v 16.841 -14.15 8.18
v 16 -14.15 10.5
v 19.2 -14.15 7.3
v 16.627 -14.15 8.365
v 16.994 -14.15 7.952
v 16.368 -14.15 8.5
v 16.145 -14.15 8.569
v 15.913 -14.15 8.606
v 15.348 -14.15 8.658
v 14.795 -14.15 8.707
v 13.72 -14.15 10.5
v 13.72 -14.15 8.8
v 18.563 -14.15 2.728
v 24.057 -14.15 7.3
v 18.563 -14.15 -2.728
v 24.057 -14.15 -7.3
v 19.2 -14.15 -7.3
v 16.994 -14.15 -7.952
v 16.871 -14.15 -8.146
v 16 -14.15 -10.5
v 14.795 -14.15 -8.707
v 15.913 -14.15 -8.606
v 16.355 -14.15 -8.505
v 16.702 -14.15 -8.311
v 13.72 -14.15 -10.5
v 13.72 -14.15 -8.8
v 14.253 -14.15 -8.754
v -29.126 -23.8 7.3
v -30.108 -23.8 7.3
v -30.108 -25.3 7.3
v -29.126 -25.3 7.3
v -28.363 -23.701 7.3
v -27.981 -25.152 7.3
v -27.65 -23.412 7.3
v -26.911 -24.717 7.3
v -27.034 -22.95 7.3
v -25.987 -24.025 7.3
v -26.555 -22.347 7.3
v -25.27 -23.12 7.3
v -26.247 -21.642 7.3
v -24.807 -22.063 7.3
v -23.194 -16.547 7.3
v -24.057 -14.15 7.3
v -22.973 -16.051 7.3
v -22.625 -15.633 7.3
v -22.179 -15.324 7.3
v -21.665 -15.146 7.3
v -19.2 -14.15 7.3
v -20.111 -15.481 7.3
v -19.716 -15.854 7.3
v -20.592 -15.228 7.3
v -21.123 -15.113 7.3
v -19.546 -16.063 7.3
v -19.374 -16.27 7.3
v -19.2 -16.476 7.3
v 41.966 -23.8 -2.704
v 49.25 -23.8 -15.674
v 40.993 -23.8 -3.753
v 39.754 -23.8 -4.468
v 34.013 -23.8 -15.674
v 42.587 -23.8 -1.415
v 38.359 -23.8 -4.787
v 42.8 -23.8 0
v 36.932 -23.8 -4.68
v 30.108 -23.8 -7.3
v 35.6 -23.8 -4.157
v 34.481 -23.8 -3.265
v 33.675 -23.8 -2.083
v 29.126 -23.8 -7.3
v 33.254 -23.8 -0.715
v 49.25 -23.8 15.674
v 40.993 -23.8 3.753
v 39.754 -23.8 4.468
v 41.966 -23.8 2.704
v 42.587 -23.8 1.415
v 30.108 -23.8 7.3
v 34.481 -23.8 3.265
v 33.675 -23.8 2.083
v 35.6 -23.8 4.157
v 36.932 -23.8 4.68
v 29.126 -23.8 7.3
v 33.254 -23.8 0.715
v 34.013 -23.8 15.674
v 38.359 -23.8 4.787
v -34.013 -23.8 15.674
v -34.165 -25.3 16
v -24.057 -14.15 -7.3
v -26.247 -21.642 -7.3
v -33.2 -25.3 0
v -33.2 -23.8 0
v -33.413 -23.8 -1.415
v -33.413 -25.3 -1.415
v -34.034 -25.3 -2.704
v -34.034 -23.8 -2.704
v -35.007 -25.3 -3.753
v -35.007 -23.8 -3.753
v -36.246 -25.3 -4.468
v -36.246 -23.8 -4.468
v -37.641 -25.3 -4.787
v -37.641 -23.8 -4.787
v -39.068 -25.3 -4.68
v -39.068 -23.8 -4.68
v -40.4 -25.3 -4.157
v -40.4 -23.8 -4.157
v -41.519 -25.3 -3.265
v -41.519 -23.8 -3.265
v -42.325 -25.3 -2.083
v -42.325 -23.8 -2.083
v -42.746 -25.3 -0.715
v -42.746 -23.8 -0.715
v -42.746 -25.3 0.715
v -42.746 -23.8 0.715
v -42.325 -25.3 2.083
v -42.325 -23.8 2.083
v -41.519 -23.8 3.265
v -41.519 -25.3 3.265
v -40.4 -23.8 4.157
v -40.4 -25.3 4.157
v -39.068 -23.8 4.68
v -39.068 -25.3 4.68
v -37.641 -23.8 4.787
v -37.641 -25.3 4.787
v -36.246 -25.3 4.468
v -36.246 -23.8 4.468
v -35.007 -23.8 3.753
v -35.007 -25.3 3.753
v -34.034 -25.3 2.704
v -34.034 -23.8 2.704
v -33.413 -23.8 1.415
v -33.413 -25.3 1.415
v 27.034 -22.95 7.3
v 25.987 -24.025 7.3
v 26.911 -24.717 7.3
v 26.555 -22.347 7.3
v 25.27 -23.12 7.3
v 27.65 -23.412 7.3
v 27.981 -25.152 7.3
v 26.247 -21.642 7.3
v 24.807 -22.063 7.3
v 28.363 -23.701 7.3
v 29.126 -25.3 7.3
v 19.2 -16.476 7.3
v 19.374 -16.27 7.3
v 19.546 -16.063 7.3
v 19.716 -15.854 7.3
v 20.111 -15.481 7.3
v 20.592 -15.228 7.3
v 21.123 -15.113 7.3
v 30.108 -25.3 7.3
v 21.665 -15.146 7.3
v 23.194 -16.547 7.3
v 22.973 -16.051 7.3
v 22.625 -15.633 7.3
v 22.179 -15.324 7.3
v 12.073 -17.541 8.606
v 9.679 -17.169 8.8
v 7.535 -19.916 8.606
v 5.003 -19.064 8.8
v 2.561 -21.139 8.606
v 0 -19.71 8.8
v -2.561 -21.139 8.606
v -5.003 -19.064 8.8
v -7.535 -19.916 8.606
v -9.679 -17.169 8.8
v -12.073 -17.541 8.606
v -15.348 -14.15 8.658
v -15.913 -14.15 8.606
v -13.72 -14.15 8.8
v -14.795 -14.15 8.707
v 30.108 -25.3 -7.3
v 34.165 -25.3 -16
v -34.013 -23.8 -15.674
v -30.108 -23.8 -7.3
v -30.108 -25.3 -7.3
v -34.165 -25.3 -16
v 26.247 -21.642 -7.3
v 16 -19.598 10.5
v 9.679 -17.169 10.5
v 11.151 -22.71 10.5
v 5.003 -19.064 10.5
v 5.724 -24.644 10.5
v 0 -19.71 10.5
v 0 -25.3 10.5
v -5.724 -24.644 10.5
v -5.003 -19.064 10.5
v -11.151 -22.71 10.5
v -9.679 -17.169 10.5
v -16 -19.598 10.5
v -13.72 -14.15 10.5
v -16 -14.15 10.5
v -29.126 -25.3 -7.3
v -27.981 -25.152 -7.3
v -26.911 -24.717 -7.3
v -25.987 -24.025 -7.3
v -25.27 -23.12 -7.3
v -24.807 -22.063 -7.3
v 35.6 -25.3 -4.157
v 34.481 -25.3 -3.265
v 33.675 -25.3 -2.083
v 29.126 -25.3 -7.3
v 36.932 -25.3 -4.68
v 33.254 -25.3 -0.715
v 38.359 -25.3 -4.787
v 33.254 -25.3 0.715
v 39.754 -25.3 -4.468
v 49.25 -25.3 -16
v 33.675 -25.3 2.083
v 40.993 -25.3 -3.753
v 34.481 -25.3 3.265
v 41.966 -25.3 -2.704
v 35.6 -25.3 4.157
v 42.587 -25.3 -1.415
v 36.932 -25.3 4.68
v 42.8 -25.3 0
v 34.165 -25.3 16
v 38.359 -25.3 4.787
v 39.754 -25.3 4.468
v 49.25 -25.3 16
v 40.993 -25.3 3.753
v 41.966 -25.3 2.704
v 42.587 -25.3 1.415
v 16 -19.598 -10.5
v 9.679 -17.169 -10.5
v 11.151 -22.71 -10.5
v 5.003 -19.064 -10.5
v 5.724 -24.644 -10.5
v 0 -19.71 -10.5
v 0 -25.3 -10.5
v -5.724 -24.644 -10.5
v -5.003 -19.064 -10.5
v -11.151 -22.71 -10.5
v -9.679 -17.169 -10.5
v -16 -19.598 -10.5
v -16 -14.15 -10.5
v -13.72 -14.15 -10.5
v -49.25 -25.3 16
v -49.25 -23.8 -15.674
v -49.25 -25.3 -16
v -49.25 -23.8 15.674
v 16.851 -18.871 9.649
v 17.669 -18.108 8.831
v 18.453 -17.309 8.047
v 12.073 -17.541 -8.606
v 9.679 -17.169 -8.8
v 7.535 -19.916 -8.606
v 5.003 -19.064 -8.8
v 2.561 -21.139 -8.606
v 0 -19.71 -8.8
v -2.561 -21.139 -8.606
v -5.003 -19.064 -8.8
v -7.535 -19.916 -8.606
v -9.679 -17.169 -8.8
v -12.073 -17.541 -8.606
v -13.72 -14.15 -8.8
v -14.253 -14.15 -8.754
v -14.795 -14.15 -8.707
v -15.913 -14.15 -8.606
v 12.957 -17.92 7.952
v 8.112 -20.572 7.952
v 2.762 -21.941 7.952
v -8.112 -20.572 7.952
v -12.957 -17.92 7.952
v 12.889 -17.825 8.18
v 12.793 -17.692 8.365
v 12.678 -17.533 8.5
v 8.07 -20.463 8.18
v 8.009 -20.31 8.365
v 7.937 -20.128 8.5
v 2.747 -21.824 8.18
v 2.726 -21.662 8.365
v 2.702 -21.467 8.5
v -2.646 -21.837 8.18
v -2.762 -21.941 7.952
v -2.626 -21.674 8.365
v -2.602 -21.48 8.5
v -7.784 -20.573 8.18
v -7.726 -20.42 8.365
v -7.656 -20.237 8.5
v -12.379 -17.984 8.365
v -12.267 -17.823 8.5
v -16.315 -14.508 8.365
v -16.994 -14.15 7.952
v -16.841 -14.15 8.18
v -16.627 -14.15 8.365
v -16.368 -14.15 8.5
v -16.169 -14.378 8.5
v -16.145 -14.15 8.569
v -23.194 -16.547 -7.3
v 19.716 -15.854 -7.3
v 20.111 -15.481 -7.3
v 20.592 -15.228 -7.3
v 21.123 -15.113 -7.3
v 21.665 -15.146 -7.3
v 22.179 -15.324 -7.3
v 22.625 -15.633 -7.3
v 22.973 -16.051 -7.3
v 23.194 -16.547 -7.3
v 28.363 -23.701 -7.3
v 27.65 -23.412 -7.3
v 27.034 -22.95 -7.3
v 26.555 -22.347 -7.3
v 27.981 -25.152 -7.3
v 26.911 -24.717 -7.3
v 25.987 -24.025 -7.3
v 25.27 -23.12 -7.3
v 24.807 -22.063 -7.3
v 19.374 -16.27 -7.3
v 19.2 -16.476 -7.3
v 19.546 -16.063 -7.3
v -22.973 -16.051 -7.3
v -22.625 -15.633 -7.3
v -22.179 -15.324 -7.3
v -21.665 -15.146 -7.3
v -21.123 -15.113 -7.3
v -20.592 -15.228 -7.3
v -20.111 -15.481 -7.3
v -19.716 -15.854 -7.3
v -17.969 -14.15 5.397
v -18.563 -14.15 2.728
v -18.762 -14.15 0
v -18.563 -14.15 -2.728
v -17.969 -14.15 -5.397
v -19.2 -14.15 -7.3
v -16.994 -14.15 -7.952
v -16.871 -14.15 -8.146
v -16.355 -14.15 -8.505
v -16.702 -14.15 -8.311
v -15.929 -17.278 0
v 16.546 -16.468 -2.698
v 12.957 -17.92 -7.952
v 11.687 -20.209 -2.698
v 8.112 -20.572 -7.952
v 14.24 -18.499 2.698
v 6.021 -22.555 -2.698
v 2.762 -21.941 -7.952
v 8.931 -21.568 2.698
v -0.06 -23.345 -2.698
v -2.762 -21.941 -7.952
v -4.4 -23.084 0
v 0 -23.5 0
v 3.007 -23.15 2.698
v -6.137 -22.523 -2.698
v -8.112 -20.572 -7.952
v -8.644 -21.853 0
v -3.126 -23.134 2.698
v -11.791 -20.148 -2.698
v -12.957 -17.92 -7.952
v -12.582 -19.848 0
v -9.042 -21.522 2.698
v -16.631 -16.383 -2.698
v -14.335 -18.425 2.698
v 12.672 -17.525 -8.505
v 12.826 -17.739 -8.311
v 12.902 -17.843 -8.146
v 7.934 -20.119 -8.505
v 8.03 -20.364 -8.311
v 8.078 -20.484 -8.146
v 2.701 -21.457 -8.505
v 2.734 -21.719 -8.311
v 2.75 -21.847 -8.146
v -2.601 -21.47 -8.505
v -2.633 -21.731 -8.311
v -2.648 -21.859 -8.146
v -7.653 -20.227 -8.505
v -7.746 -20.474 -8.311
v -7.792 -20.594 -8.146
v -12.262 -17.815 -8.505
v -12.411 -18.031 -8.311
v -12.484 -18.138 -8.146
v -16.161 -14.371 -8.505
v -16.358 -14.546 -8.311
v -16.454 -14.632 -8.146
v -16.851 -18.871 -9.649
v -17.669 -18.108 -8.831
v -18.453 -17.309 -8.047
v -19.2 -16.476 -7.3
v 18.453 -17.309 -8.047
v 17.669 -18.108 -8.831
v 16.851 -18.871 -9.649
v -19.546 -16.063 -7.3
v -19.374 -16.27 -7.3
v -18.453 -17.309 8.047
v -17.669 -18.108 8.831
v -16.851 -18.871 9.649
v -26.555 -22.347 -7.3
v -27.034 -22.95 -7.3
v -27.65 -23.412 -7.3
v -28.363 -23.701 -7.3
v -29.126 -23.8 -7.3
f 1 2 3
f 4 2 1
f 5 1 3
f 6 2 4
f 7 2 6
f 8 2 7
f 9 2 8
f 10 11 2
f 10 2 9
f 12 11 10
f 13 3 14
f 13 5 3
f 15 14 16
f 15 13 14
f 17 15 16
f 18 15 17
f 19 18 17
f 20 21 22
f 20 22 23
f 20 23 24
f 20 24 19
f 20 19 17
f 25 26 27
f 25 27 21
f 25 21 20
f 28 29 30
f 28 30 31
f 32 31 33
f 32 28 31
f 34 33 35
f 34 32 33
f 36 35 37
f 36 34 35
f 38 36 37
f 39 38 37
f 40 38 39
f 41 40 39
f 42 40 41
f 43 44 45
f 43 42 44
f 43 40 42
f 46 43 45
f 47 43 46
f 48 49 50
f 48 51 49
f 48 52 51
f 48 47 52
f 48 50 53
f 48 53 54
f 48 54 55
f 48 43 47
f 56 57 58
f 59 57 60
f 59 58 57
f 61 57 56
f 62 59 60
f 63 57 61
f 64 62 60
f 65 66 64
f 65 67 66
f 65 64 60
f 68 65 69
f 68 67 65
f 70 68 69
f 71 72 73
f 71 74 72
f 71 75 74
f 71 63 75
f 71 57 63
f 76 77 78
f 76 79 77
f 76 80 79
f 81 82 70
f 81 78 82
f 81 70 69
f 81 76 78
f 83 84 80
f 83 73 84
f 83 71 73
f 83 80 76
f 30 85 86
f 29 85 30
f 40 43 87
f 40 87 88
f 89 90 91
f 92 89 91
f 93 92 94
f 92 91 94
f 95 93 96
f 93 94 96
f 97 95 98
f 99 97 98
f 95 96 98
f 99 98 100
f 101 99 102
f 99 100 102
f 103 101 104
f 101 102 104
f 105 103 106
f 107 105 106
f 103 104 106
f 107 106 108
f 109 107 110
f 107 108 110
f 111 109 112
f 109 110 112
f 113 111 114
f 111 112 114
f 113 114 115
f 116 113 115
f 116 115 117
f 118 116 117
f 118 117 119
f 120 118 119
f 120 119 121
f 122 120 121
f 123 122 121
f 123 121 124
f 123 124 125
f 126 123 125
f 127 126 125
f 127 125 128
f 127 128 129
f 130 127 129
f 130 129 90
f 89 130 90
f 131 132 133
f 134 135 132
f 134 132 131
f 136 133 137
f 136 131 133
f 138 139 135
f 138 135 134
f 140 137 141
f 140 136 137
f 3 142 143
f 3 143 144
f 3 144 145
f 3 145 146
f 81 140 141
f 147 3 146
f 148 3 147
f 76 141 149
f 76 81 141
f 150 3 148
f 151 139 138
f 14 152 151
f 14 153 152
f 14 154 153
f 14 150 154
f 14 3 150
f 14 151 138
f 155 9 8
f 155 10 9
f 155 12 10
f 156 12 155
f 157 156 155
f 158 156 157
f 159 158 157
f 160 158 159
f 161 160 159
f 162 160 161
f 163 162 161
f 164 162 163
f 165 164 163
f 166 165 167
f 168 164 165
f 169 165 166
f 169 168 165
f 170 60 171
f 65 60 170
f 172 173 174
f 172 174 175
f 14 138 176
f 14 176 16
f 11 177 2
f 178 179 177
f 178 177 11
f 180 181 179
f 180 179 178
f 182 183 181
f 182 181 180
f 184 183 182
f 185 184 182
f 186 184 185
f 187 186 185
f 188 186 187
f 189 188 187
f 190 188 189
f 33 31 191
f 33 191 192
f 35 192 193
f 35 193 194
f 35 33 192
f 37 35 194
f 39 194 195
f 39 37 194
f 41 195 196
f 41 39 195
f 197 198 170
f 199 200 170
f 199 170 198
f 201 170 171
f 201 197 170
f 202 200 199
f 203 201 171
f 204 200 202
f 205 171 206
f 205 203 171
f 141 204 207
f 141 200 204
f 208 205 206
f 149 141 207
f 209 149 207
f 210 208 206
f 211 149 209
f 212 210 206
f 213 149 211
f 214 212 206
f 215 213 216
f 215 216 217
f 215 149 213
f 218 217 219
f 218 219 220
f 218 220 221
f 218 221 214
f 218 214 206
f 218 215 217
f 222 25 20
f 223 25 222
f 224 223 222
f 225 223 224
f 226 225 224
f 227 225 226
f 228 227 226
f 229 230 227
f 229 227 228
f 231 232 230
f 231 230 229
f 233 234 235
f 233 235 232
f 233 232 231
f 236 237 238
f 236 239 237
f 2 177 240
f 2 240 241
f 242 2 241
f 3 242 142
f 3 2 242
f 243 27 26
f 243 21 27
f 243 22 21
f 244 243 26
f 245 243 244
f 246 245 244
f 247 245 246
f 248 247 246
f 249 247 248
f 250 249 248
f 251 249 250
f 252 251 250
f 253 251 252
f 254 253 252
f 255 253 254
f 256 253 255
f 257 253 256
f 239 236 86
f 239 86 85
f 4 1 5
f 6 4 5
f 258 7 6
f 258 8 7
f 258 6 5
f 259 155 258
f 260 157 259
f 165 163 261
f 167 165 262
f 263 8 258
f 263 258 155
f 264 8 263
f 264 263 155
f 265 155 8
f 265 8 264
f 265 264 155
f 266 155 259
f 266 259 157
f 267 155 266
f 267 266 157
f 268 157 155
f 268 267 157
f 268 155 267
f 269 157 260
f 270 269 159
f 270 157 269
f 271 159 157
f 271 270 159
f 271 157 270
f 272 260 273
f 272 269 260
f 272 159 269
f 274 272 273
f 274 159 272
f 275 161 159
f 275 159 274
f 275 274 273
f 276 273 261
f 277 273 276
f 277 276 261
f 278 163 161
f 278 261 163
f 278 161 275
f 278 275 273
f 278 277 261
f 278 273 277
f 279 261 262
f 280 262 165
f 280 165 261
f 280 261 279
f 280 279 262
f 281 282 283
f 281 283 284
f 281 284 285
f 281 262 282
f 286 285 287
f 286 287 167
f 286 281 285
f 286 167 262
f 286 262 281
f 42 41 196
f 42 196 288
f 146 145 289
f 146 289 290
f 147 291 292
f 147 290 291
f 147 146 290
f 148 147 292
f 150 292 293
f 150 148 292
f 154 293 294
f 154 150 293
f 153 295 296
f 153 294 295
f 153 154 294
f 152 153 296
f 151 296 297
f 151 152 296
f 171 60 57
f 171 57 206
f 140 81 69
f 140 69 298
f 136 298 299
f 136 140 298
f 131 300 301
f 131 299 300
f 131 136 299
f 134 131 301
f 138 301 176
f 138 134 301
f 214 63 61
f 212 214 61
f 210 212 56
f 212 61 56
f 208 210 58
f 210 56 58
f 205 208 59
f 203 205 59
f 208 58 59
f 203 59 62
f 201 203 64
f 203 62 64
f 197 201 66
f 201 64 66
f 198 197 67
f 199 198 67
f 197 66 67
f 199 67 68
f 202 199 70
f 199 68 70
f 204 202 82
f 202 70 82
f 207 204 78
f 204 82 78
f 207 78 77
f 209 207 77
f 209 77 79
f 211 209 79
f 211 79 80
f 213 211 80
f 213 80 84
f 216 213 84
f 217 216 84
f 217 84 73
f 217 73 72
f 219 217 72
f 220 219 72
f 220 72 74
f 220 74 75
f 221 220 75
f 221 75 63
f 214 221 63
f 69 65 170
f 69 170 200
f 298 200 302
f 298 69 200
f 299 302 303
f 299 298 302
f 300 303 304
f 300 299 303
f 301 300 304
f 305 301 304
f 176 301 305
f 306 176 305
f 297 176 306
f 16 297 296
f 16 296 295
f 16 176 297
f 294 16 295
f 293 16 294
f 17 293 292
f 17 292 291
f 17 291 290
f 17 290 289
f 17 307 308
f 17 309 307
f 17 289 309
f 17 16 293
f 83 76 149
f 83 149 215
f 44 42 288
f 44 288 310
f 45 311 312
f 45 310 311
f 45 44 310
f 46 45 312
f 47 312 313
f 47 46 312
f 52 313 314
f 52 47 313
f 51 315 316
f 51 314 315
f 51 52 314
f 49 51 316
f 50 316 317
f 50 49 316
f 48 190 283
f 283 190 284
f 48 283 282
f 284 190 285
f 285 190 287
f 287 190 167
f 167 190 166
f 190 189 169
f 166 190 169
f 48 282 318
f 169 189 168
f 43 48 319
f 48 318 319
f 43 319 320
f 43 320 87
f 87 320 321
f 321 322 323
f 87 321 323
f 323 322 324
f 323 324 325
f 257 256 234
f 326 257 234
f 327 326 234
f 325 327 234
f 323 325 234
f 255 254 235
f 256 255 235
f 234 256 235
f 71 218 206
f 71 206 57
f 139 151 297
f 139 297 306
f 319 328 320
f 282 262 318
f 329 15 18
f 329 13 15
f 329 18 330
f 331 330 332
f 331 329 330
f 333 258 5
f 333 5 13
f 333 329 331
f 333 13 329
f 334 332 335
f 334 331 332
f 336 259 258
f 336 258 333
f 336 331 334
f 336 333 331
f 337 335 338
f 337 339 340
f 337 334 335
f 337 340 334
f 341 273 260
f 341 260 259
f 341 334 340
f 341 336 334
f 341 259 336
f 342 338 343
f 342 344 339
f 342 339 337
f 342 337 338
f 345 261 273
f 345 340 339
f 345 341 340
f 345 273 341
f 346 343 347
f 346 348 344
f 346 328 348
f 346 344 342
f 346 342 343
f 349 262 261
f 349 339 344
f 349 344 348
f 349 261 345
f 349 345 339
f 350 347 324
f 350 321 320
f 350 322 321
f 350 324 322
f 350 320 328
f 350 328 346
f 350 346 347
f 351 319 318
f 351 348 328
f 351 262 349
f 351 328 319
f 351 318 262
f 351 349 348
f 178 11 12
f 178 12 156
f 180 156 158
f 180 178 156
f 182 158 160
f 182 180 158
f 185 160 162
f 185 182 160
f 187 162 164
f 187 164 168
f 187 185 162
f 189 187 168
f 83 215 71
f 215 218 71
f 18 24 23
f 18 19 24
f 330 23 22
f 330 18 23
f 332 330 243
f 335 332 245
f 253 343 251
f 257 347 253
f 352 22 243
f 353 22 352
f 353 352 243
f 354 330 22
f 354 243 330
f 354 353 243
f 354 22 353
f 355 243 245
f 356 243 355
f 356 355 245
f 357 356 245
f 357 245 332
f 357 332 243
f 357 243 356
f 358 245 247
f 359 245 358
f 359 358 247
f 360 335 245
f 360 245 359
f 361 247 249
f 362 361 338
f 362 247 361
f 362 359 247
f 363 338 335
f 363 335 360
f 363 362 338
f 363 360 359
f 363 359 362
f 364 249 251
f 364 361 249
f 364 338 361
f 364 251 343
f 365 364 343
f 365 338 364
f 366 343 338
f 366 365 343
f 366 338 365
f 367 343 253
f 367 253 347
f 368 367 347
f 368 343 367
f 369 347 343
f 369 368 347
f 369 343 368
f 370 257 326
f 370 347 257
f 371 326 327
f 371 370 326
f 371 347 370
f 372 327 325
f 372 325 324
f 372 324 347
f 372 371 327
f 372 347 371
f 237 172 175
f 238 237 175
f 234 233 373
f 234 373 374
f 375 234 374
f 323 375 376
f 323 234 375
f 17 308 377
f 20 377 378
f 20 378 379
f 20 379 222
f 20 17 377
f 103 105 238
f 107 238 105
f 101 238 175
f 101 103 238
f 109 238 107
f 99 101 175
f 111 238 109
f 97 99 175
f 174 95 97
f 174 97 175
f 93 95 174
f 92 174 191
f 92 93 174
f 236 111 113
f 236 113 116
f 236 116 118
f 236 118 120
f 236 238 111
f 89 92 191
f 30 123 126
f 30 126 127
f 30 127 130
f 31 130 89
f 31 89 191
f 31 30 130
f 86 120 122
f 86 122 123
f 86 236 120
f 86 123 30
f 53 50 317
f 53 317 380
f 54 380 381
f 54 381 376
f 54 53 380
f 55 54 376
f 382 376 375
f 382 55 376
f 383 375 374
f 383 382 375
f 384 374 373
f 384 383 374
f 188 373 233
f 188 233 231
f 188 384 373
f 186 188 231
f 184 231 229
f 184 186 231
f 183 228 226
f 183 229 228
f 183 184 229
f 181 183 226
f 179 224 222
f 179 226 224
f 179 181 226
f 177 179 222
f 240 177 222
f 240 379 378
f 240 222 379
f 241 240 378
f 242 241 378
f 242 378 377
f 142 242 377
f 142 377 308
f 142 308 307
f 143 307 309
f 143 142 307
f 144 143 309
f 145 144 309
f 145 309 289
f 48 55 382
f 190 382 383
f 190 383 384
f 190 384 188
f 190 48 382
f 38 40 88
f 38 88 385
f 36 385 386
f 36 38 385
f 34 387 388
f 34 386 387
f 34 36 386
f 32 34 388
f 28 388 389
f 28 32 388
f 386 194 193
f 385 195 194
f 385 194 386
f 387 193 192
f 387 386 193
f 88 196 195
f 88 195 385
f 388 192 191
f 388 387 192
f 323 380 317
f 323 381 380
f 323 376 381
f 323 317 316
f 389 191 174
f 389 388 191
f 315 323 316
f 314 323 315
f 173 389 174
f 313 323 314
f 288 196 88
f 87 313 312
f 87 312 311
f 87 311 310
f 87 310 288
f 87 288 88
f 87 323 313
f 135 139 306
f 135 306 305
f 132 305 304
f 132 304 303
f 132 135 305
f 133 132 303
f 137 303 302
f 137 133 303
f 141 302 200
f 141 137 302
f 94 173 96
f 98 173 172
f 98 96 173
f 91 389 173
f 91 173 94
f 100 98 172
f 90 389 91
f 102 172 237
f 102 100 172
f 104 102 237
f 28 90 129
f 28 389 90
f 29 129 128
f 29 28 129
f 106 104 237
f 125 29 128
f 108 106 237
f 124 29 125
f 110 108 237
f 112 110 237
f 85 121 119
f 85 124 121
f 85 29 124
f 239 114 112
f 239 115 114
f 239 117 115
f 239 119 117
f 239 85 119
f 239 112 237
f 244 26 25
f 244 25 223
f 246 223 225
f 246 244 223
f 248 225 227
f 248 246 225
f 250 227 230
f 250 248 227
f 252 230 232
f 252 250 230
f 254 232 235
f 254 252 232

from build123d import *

# Parameters (mm, degrees)
SALIENTE_EXTRUIR1_DEPTH      = 16
SALIENTE_EXTRUIR1_DEPTH_BACK = 16
CORTAR_EXTRUIR1_DEPTH        = 49.25
CORTAR_EXTRUIR1_DEPTH_BACK   = 49.25
CROQUIS3_R                   = 4.8
CORTAR_EXTRUIR2_DEPTH        = 25.3
CROQUIS4_R                   = 4.8
CORTAR_EXTRUIR3_DEPTH        = 25.3
CORTAR_EXTRUIR4_DEPTH        = 98.5
CORTAR_EXTRUIR4_DEPTH_BACK   = 98.5
CROQUIS6_W                   = 64
CROQUIS6_H                   = 50.5
CROQUIS7_W                   = 118.5
CROQUIS7_H                   = 52
CORTAR_EXTRUIR5_DEPTH        = 25.3


with BuildPart() as part:
    # Croquis1 → Saliente-Extruir1 (new, two sides: drawn at the far end of the back side and taken through both)
    with BuildSketch(Plane.XY.offset(-SALIENTE_EXTRUIR1_DEPTH_BACK)):
        with BuildLine():
            Line((-49.25, -23.8), (-49.25, -25.3))
            Line((-49.25, -25.3), (-29.12605042, -25.3))
            ThreePointArc((-29.12605042, -25.3), (-26.427107301, -24.400792418), (-24.806790899, -22.062536016))
            Line((-24.806790899, -22.062536016), (-23.194455177, -16.5465774))
            ThreePointArc((-23.194455177, -16.5465774), (-21.665135808, -15.146167956), (-19.716192024, -15.854392832))
            ThreePointArc((-19.716192024, -15.854392832), (0, -25.3), (19.716192024, -15.854392832))
            ThreePointArc((19.716192024, -15.854392832), (21.665135808, -15.146167956), (23.194455177, -16.5465774))
            Line((23.194455177, -16.5465774), (24.806790899, -22.062536016))
            ThreePointArc((24.806790899, -22.062536016), (26.427107301, -24.400792418), (29.12605042, -25.3))
            Line((29.12605042, -25.3), (49.25, -25.3))
            Line((49.25, -25.3), (49.25, -23.8))
            Line((49.25, -23.8), (29.12605042, -23.8))
            ThreePointArc((29.12605042, -23.8), (27.326755007, -23.200528279), (26.246544073, -21.641690678))
            Line((26.246544073, -21.641690678), (22.185653478, -7.748985725))
            ThreePointArc((22.185653478, -7.748985725), (0, -23.5), (-22.185653478, -7.748985725))
            Line((-22.185653478, -7.748985725), (-26.246544073, -21.641690678))
            ThreePointArc((-26.246544073, -21.641690678), (-27.326755007, -23.200528279), (-29.12605042, -23.8))
            Line((-29.12605042, -23.8), (-49.25, -23.8))
        make_face()
    extrude(amount=SALIENTE_EXTRUIR1_DEPTH + SALIENTE_EXTRUIR1_DEPTH_BACK)

    # Croquis2 → Cortar-Extruir1 (cut, two sides: drawn at the far end of the back side and taken through both)
    with BuildSketch(Plane(origin=(0, 0, 0), x_dir=(0, 0, -1), z_dir=(1, 0, 0)).offset(-CORTAR_EXTRUIR1_DEPTH_BACK)):
        Polygon((-16, -25.3), (-10.5, 0), (-10.5, 25.2), (10.5, 25.2), (10.5, 0), (16, -25.3), (16, 26.2), (-16, 26.2), align=None)
    extrude(amount=CORTAR_EXTRUIR1_DEPTH + CORTAR_EXTRUIR1_DEPTH_BACK, mode=Mode.SUBTRACT)

    # Croquis3 → Cortar-Extruir2 (cut)
    with BuildSketch(Plane(origin=(0, 0, 0), x_dir=(1, 0, 0), z_dir=(0, 1, 0))):
        with Locations((38, 0)):
            Circle(CROQUIS3_R)
    extrude(amount=-CORTAR_EXTRUIR2_DEPTH, mode=Mode.SUBTRACT)

    # Croquis4 → Cortar-Extruir3 (cut)
    with BuildSketch(Plane(origin=(0, 0, 0), x_dir=(1, 0, 0), z_dir=(0, 1, 0))):
        with Locations((-38, 0)):
            Circle(CROQUIS4_R)
    extrude(amount=-CORTAR_EXTRUIR3_DEPTH, mode=Mode.SUBTRACT)

    # Croquis5 → Revolución1 (revolve)
    with BuildSketch(Plane(origin=(0, 0, 0), x_dir=(0, 0, -1), z_dir=(1, 0, 0))):
        with BuildLine():
            Line((-10.5, -19.709677419), (-10.5, -23.65))
            Line((-10.5, -23.65), (10.5, -23.65))
            Line((10.5, -23.65), (10.5, -19.709677419))
            Line((10.5, -19.709677419), (8.8, -19.709677419))
            Line((8.8, -19.709677419), (8.60641193, -21.293920434))
            ThreePointArc((8.60641193, -21.293920434), (8.395381567, -21.796423837), (7.952186088, -22.113632366))
            ThreePointArc((7.952186088, -22.113632366), (-4.5e-08, -23.5), (-7.952186172, -22.113632336))
            ThreePointArc((-7.952186172, -22.113632336), (-8.395381595, -21.796423802), (-8.60641193, -21.293920434))
            Line((-8.60641193, -21.293920434), (-8.8, -19.709677419))
            Line((-8.8, -19.709677419), (-10.5, -19.709677419))
        make_face()
    revolve(axis=Axis((0, 0, 16), (0, 0, -1)))

    # Croquis6 → Cortar-Extruir4 (cut, two sides: drawn at the far end of the back side and taken through both)
    with BuildSketch(Plane(origin=(0, 0, 0), x_dir=(0, 0, -1), z_dir=(1, 0, 0)).offset(-CORTAR_EXTRUIR4_DEPTH_BACK)):
        with Locations((0, 11.1)):
            Rectangle(CROQUIS6_W, CROQUIS6_H)
    extrude(amount=CORTAR_EXTRUIR4_DEPTH + CORTAR_EXTRUIR4_DEPTH_BACK, mode=Mode.SUBTRACT)

    # Croquis7 → Cortar-Extruir5 (cut)
    with BuildSketch(Plane(origin=(0, 0, 0), x_dir=(1, 0, 0), z_dir=(0, 1, 0))):
        Rectangle(CROQUIS7_W, CROQUIS7_H)
        Polygon((-49.25, 16), (-49.25, -16), (-34.16469212, -16), (-30.107815494, -7.3), (-19.2, -7.3), (-16, -10.5), (16, -10.5), (19.2, -7.3), (30.107815494, -7.3), (34.16469212, -16), (49.25, -16), (49.25, 16), (34.16469212, 16), (30.107815494, 7.3), (19.2, 7.3), (16, 10.5), (-16, 10.5), (-19.2, 7.3), (-30.107815494, 7.3), (-34.16469212, 16), align=None, mode=Mode.SUBTRACT)
    extrude(amount=-CORTAR_EXTRUIR5_DEPTH, mode=Mode.SUBTRACT)


solid = part.part
